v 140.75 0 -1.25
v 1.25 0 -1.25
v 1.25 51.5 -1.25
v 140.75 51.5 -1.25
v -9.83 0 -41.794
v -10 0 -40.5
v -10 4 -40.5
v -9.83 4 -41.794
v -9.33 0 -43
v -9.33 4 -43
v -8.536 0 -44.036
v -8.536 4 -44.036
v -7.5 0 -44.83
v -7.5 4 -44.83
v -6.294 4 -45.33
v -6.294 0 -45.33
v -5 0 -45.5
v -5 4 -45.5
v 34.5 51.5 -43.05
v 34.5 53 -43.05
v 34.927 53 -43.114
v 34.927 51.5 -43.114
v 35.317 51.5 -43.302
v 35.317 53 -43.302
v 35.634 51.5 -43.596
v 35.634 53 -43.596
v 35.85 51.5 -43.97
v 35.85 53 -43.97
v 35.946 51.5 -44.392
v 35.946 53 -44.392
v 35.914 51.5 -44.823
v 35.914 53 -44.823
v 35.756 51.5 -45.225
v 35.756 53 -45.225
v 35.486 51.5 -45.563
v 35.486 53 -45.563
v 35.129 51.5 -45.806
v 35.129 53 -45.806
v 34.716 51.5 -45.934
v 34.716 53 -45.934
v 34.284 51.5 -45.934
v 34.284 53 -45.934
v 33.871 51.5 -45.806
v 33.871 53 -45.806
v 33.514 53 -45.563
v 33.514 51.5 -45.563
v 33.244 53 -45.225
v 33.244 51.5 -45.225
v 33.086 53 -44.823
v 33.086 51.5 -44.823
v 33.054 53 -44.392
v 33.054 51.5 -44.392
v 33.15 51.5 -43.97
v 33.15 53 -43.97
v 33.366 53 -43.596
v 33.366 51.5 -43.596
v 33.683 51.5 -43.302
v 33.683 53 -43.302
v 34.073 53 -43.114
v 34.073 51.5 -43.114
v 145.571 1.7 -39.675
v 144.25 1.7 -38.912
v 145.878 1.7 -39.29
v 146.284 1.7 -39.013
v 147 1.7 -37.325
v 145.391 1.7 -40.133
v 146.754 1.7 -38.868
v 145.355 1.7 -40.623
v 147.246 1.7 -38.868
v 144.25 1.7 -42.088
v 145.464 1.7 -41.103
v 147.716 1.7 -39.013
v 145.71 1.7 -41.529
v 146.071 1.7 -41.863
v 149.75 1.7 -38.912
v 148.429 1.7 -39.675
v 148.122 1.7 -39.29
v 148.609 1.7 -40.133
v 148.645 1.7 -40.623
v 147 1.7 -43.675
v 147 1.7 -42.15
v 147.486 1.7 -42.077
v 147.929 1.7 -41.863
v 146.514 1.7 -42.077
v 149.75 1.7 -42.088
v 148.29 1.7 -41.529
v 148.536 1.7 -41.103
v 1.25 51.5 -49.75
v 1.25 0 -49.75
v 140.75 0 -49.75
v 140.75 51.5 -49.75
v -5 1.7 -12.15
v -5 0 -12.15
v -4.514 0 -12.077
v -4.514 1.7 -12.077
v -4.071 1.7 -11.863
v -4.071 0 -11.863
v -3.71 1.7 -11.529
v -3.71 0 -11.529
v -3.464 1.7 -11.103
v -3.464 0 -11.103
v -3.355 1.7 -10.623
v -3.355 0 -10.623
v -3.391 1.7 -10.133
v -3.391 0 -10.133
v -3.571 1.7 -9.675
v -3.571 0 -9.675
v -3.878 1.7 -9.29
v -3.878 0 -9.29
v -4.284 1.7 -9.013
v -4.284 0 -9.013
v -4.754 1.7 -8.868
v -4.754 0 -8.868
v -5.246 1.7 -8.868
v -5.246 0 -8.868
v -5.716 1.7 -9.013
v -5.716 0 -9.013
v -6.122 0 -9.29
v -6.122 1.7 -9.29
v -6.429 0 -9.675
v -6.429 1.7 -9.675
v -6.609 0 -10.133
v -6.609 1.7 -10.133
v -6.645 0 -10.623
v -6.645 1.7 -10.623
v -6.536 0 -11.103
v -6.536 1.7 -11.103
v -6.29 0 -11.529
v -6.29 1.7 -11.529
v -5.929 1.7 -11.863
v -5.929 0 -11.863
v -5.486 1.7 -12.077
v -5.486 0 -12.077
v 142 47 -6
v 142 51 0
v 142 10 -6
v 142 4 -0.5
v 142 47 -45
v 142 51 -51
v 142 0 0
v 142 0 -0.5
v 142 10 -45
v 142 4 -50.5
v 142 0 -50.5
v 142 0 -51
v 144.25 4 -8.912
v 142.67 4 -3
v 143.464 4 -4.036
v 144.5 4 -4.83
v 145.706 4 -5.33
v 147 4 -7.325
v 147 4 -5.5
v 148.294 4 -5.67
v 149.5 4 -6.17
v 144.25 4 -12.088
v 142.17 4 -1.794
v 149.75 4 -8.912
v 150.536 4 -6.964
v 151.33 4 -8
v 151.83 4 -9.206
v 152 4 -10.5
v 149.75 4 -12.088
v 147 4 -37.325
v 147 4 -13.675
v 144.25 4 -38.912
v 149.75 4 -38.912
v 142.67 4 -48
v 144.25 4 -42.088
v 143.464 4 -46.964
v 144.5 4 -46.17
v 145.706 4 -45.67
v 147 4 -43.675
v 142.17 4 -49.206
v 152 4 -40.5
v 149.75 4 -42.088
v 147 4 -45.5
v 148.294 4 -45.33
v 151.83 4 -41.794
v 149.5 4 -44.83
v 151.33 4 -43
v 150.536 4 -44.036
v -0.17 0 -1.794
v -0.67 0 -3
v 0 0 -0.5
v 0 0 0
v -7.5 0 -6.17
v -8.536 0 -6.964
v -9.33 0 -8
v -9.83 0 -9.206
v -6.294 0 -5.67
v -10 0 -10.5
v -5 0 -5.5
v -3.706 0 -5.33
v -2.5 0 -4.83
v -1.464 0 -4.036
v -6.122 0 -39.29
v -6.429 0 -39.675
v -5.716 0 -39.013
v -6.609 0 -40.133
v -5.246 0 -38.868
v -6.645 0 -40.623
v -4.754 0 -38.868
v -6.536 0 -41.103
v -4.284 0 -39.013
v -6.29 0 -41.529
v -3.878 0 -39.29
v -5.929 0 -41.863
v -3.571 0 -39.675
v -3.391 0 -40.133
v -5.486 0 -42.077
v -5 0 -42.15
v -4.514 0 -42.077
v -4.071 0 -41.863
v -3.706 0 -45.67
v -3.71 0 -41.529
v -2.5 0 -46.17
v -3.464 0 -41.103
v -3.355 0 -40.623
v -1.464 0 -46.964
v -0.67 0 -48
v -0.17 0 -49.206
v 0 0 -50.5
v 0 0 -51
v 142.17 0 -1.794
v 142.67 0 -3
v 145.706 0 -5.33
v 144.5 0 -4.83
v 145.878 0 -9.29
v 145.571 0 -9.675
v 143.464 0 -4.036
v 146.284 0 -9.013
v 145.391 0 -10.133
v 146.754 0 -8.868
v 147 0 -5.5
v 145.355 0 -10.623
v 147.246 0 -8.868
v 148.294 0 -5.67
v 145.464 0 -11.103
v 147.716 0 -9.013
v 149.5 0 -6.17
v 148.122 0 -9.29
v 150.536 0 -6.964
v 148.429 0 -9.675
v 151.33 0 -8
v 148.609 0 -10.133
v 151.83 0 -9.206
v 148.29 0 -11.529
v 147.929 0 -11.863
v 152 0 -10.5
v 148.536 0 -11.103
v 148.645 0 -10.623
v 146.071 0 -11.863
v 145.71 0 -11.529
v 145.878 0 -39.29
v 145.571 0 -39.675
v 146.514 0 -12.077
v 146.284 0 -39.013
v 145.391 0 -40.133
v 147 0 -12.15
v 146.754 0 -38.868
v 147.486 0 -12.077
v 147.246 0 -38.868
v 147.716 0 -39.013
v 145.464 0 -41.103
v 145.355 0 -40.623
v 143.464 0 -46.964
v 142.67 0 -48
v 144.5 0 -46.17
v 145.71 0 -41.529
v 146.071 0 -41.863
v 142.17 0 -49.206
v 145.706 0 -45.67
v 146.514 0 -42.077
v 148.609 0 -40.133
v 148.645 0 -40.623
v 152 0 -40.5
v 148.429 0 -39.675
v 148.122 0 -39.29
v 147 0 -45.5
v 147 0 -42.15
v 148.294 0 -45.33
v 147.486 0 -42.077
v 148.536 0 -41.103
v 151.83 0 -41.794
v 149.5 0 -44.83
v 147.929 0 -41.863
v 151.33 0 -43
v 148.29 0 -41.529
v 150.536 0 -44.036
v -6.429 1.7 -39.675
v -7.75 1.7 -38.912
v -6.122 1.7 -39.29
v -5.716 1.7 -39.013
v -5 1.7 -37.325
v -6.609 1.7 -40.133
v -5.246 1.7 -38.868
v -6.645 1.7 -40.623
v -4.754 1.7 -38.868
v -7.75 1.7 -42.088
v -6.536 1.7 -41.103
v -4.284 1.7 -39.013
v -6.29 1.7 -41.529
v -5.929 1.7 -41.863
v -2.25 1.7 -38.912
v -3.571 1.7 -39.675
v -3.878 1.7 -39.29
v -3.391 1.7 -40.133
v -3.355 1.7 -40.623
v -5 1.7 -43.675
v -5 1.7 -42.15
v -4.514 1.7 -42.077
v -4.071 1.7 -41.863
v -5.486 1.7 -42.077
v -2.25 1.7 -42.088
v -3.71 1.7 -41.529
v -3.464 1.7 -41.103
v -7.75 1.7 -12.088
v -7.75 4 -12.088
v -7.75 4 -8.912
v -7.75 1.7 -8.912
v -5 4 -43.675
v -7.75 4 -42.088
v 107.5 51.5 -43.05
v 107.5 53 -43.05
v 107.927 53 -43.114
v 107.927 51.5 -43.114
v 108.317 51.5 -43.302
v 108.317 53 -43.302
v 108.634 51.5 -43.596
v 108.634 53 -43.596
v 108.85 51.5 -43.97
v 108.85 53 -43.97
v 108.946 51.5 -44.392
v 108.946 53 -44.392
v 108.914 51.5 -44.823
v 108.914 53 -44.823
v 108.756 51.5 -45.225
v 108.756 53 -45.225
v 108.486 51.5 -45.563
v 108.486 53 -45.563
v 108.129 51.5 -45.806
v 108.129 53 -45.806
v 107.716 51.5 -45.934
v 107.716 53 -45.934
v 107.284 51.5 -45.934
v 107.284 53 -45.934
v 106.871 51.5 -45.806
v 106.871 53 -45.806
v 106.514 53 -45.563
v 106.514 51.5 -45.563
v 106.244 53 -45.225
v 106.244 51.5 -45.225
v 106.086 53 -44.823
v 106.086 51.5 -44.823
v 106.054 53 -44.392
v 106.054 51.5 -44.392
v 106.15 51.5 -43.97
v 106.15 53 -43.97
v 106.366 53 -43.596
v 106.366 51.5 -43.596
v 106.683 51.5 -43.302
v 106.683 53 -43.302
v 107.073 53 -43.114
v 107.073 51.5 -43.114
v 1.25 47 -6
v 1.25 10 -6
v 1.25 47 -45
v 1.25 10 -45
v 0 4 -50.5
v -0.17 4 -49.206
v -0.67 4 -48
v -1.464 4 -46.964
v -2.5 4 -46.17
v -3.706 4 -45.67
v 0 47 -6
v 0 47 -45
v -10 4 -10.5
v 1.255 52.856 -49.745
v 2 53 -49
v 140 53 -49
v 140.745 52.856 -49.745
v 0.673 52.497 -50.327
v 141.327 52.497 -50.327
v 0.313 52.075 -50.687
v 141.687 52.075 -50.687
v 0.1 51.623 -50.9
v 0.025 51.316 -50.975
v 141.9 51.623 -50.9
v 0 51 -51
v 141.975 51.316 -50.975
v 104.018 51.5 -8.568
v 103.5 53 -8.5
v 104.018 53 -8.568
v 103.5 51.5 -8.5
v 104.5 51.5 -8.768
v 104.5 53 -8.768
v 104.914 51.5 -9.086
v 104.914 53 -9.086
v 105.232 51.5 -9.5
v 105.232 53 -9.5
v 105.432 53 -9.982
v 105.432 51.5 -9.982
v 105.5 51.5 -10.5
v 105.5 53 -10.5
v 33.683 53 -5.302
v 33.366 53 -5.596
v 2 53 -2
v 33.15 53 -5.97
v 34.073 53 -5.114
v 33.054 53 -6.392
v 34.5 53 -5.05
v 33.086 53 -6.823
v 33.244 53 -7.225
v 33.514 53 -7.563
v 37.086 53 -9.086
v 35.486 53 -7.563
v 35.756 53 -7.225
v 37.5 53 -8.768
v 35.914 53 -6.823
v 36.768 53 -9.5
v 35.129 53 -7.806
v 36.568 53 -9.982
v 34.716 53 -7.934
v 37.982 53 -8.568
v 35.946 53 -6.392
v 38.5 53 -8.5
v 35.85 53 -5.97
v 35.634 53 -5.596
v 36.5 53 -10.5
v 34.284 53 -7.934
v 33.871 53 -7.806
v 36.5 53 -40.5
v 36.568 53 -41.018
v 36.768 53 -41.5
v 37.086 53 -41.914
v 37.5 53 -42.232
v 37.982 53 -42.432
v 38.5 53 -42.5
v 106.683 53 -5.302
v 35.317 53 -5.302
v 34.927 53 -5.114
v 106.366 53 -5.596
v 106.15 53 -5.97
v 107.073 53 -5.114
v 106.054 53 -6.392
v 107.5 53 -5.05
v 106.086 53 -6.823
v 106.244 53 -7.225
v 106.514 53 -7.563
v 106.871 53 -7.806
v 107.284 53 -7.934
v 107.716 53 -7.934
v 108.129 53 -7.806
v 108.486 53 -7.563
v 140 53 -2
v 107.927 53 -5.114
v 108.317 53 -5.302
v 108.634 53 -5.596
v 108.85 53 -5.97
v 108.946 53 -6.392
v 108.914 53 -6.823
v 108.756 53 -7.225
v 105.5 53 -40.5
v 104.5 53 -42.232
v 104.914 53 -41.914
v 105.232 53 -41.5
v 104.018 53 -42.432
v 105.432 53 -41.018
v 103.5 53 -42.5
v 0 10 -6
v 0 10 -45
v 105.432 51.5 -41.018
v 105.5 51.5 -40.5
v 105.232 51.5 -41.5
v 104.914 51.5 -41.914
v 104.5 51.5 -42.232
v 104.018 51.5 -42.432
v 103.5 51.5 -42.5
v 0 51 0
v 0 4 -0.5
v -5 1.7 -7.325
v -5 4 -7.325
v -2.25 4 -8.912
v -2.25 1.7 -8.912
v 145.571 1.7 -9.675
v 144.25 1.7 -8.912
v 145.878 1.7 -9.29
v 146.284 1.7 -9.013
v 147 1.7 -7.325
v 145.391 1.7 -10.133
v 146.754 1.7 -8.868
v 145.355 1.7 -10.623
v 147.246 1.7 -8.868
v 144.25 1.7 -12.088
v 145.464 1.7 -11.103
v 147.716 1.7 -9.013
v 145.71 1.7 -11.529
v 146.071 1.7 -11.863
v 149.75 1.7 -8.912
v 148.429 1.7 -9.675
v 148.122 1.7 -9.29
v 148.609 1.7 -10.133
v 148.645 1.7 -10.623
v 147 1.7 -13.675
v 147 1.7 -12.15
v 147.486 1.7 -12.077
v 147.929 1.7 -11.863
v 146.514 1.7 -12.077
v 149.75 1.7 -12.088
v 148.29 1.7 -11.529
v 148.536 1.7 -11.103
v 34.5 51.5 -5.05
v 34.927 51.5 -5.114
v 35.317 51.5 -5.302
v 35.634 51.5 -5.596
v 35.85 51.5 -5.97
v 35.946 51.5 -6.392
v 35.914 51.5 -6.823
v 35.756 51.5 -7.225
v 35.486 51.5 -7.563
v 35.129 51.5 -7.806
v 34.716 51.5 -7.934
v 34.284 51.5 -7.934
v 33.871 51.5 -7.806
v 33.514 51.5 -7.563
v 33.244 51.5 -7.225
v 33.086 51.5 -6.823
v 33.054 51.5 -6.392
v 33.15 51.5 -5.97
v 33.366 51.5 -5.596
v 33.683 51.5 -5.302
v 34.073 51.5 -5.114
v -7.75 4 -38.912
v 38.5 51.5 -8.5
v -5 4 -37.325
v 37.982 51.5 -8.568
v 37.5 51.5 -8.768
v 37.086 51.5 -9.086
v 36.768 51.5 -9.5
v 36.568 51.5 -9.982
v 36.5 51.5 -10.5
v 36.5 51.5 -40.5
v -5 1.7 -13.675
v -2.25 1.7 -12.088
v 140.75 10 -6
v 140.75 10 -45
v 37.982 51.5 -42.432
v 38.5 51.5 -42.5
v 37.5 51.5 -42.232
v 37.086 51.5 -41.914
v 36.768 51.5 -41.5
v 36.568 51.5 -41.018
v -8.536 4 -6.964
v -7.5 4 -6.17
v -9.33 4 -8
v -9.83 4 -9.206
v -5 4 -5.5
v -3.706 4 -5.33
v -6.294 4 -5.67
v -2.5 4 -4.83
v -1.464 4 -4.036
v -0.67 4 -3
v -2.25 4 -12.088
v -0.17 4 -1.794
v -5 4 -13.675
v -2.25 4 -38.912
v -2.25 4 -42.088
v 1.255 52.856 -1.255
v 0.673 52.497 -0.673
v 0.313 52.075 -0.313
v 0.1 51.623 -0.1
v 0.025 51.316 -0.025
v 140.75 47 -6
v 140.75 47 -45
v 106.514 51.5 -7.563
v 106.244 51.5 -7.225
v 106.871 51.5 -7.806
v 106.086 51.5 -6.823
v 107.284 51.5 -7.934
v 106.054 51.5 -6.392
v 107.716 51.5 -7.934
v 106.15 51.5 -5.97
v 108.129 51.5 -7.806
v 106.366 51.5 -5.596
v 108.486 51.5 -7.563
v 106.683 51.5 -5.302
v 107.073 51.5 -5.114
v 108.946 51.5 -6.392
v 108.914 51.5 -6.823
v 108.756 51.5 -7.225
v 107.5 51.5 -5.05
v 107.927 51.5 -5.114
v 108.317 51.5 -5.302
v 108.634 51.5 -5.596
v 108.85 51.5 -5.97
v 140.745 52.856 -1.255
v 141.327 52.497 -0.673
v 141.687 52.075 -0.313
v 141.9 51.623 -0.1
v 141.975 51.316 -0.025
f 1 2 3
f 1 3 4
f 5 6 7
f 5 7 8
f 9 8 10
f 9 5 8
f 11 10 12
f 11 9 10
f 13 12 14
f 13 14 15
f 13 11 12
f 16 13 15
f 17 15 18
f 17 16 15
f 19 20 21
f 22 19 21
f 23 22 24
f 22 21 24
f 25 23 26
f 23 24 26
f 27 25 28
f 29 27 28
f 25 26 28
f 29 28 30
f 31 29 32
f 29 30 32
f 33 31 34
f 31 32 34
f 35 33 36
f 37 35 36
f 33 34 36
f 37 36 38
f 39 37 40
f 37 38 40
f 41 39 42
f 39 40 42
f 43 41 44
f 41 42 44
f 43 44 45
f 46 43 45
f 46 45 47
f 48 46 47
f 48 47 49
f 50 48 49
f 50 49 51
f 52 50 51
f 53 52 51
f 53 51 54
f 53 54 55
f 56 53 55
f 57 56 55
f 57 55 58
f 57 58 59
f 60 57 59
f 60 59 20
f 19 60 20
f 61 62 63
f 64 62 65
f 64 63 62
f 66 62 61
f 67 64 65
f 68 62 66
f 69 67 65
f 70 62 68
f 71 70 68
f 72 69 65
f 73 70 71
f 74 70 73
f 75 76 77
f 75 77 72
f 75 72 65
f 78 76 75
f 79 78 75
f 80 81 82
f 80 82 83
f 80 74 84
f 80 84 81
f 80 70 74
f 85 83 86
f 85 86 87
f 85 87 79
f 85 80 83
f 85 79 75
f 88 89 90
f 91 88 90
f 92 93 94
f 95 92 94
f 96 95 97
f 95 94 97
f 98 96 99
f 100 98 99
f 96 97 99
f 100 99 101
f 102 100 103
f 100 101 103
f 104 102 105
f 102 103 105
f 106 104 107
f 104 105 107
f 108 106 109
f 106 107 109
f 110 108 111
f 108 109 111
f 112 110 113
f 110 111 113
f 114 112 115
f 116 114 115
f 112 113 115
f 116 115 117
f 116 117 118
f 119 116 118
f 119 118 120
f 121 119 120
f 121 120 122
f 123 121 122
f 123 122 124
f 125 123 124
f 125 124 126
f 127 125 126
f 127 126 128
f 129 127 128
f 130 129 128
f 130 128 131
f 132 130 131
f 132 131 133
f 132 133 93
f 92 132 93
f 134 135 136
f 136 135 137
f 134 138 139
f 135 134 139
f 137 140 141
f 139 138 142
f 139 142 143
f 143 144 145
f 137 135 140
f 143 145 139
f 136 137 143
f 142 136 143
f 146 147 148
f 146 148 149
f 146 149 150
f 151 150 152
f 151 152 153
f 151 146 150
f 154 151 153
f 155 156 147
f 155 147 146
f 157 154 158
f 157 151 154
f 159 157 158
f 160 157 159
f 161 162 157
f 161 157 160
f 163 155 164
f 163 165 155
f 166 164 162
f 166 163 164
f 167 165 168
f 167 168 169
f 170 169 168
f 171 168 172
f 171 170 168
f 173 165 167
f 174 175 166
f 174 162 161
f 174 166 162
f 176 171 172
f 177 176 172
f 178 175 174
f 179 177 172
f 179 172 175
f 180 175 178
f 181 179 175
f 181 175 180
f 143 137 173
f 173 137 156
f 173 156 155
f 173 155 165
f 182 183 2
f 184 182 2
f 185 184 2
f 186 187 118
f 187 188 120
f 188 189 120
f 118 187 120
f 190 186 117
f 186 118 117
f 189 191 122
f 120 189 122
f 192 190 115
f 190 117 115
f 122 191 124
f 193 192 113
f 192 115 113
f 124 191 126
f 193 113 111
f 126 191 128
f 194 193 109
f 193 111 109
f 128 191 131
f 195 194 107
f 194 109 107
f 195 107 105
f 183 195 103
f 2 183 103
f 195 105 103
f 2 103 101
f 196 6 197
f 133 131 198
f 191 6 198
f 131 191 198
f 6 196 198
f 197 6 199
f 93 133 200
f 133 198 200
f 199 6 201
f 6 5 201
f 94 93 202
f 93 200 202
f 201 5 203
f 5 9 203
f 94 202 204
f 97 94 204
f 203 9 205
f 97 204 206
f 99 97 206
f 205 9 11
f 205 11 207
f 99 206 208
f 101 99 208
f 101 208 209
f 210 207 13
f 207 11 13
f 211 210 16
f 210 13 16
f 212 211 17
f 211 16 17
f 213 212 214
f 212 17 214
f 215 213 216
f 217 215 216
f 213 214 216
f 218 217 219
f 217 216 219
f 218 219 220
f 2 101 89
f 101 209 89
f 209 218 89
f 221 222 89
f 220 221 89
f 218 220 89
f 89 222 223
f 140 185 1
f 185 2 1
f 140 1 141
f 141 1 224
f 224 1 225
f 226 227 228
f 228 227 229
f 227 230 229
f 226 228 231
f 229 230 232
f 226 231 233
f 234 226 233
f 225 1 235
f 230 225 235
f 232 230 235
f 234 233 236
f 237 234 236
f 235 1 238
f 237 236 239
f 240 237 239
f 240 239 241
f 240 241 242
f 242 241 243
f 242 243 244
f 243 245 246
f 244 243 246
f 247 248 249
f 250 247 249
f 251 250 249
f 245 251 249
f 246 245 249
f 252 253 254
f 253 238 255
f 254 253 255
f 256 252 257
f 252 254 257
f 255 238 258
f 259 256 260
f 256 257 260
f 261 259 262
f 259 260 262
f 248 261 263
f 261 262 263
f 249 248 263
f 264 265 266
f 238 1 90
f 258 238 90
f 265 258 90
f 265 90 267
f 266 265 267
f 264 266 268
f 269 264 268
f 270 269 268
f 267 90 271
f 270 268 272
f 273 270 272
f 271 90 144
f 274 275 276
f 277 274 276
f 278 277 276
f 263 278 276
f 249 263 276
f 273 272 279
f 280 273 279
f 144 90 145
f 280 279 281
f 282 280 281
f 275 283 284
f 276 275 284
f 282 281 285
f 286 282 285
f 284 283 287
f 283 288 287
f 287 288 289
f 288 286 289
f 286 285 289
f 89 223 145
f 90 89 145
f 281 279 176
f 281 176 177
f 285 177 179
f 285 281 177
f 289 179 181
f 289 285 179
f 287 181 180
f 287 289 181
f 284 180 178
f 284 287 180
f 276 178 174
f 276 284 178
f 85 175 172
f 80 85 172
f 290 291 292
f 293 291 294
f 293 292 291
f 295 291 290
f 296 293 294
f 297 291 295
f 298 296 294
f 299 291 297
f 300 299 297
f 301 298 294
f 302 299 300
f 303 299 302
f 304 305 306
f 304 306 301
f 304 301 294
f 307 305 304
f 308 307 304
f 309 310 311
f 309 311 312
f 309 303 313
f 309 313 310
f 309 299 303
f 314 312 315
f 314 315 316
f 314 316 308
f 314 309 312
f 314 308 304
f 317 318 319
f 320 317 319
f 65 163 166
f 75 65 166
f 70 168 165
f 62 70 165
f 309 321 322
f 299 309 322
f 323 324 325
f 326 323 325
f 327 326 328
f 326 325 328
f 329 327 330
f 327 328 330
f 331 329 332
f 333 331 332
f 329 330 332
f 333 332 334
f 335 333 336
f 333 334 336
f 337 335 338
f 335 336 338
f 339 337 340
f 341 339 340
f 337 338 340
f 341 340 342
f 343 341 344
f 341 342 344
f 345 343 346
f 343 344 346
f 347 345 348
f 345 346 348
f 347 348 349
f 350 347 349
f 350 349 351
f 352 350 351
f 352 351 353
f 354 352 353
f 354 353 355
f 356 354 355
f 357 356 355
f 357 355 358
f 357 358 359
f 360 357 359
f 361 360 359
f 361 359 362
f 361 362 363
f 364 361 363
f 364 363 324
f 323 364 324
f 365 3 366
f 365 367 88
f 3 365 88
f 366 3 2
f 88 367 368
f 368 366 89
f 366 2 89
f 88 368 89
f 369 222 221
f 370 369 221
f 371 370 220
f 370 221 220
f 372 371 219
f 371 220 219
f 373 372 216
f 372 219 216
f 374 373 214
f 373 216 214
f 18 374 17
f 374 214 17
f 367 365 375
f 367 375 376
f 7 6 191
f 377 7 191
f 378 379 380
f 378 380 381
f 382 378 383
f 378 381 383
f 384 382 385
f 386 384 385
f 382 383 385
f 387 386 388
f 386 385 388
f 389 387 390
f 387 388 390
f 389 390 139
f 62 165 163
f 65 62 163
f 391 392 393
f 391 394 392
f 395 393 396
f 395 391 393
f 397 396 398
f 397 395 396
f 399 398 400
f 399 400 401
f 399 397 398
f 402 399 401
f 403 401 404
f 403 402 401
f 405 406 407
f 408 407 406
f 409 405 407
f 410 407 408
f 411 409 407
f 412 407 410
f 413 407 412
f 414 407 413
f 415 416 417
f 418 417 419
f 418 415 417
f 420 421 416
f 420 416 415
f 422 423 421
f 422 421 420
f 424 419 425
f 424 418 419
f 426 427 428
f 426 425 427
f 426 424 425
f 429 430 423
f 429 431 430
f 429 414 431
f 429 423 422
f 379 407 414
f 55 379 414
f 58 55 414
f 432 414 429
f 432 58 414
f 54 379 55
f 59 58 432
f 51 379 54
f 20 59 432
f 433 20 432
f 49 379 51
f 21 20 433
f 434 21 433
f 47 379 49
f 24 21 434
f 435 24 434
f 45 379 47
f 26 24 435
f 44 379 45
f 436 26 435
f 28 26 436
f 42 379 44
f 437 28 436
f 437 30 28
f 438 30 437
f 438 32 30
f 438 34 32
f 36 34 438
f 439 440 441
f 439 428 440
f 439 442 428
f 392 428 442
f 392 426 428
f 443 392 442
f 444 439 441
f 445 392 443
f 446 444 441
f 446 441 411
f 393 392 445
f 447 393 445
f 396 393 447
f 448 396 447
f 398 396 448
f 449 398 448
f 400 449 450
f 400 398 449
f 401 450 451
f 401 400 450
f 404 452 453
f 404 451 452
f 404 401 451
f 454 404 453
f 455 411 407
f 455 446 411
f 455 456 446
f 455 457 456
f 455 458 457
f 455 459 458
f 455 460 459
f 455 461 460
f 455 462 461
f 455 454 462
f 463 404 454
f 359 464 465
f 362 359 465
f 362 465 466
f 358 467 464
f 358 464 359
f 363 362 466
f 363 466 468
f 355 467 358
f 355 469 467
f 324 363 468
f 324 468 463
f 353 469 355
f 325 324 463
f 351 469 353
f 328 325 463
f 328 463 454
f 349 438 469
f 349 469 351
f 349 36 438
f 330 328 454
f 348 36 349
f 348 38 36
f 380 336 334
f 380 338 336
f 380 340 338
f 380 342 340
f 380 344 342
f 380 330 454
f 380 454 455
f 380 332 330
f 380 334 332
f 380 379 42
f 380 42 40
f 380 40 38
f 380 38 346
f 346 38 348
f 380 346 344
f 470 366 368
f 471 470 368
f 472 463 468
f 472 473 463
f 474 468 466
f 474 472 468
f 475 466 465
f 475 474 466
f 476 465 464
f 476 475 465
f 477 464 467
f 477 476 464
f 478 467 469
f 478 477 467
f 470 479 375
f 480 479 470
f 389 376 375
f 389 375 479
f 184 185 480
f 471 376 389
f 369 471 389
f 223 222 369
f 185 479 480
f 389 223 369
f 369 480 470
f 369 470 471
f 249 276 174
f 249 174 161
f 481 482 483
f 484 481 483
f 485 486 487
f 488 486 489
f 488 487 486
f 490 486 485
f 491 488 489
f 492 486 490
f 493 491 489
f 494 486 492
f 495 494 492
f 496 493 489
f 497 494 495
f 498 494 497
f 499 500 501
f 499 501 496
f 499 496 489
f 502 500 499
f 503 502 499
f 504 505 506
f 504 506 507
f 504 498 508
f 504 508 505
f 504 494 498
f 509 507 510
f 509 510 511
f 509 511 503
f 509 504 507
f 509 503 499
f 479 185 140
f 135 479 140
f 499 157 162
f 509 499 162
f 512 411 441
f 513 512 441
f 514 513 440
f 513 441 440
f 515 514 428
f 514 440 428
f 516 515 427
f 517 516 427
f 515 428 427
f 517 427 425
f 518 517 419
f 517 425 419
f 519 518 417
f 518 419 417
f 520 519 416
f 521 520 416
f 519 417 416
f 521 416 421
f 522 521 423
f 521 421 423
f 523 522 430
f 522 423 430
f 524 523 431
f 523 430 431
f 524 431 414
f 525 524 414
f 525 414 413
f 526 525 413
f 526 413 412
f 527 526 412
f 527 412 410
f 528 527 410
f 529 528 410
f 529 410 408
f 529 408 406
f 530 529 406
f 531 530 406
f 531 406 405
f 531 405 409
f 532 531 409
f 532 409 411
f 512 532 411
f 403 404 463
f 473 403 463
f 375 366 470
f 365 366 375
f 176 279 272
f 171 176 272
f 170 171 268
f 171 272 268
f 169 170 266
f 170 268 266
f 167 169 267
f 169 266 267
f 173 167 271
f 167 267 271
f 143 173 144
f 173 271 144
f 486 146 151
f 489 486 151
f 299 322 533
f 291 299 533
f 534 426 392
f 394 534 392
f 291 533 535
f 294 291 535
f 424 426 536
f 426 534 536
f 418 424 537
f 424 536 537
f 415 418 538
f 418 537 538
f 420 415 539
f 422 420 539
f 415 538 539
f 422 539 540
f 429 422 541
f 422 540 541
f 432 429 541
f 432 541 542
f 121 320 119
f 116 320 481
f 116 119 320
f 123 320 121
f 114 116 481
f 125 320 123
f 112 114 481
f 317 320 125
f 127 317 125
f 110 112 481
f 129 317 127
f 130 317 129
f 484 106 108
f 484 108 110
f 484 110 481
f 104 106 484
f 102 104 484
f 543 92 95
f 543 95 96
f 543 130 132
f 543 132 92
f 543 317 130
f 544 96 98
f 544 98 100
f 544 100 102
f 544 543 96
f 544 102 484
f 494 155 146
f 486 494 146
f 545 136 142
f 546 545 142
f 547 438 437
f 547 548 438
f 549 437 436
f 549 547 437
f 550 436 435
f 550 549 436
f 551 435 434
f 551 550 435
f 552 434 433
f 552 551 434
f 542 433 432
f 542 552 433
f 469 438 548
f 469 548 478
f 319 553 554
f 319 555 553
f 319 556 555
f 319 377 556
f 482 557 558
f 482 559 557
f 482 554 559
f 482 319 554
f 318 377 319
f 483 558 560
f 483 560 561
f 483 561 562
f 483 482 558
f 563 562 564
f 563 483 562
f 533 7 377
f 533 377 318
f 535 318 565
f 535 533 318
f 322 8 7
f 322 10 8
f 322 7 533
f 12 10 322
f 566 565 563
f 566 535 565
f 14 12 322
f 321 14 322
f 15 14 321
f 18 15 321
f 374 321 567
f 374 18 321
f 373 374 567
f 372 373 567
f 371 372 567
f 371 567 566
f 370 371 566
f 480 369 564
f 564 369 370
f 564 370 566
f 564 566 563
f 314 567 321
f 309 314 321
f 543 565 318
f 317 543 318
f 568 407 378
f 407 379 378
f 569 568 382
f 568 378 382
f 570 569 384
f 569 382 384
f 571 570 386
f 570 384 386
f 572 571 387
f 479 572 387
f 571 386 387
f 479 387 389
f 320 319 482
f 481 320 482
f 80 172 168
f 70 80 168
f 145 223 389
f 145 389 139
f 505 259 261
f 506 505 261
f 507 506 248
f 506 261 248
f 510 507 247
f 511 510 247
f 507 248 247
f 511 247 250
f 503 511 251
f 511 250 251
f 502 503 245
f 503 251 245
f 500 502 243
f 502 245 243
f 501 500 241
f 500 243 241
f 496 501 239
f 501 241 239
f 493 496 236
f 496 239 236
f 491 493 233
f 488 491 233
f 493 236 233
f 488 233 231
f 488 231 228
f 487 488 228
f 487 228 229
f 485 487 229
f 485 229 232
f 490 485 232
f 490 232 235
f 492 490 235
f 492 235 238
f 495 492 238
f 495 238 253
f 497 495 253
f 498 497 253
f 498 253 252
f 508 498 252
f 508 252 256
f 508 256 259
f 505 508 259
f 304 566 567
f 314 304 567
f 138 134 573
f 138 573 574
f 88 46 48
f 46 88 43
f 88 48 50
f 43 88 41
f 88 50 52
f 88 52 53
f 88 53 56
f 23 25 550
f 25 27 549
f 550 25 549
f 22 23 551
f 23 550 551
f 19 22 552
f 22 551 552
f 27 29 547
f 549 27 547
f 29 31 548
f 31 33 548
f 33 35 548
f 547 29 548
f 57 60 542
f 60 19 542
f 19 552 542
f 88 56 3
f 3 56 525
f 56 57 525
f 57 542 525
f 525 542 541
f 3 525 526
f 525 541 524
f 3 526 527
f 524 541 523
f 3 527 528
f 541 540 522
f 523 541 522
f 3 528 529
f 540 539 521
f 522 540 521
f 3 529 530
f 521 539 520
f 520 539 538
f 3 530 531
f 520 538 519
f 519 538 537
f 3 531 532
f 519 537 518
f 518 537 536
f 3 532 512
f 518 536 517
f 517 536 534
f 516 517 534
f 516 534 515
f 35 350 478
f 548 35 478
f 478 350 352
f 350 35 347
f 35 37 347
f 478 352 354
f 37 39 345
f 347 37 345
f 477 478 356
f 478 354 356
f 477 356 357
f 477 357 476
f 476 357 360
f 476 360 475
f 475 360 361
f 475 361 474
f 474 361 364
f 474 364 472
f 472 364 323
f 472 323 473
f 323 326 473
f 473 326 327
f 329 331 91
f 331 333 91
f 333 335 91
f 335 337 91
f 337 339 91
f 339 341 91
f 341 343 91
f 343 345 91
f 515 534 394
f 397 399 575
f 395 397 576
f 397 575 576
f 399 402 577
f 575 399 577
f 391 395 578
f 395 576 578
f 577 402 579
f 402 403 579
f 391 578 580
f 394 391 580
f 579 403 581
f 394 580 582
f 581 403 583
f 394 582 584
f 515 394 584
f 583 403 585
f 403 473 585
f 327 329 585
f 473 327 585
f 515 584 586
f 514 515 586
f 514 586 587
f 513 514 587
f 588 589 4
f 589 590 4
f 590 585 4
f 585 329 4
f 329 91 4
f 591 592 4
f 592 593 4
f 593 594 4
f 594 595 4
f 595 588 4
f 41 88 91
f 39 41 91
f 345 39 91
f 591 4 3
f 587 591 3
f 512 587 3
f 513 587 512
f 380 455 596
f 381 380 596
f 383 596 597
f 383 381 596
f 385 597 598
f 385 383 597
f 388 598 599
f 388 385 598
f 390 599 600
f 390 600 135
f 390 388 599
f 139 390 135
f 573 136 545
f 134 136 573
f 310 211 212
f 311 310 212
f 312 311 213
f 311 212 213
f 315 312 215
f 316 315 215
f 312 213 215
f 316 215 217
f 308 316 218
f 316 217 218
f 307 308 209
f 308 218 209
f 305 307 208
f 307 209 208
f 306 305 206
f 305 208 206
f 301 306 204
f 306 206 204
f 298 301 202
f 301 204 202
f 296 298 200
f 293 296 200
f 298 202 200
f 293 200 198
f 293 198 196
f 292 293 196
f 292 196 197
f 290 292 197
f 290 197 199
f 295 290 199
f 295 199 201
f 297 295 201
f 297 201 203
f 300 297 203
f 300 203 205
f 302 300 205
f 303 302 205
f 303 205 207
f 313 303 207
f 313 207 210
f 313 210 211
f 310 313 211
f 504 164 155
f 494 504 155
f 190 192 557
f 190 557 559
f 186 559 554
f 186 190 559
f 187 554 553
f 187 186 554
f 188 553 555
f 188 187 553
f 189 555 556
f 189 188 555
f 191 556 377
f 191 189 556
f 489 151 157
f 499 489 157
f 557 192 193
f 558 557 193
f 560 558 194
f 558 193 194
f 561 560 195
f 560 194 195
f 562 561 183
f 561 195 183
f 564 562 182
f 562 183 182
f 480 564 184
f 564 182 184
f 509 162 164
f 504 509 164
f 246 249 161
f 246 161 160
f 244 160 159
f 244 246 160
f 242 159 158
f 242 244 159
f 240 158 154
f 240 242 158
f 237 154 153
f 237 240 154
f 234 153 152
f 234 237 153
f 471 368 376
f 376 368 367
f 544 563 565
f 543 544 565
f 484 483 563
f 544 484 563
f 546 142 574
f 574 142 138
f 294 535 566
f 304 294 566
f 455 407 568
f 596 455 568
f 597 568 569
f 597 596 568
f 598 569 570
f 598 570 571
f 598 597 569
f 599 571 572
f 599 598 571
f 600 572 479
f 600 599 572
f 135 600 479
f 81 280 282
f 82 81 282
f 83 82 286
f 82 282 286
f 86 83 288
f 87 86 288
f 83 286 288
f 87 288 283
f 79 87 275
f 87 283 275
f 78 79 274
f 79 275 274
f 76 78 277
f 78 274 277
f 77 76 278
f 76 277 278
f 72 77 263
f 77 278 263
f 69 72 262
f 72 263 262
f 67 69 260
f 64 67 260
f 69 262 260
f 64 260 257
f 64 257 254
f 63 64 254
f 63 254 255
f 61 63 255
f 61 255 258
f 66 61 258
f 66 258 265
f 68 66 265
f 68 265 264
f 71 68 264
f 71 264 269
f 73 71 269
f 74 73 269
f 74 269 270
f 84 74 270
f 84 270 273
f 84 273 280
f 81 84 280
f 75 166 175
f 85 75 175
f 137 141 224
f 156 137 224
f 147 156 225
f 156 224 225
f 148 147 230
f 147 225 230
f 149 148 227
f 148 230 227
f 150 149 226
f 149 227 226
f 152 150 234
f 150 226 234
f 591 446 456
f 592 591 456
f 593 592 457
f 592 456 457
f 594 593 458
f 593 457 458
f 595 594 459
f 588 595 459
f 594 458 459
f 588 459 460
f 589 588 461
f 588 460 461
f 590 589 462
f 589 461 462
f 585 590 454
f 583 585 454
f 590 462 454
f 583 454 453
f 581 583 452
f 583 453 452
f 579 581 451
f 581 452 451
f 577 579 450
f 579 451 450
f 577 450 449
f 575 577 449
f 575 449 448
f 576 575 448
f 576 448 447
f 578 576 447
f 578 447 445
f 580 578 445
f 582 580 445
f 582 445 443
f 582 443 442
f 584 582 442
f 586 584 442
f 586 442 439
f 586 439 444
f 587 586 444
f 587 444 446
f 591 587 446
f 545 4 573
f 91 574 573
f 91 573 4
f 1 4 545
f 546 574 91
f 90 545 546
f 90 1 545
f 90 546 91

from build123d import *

# Parameters (mm, degrees)
SKETCH1_W                 = 142
SKETCH1_H                 = 51
BOSS_EXTRUDE1_DEPTH       = 53
SHELL1_T                  = -1.25
SHELL1_THICKNESS_2_FACE_W = 48.5
SHELL1_THICKNESS_2_FACE_H = 139.5
SHELL1_THICKNESS_2_DEPTH  = 0.25
SKETCH2_W                 = 10
SKETCH2_H                 = 40
SKETCH2_R                 = 1.65
BOSS_EXTRUDE2_DEPTH       = 4
SKETCH3_W                 = 39
SKETCH3_H                 = 37
CUT_EXTRUDE1_DEPTH        = 169.860889492
CUT_EXTRUDE2_DEPTH        = 2.3
FILLET2_START             = -1
FILLET2_DEPTH             = 5
FILLET2_2_DEPTH           = 4
SKETCH5_R                 = 1.45
CUT_EXTRUDE3_DEPTH        = 169.860889492
SKETCH7_W                 = 69
SKETCH7_H                 = 34
CUT_EXTRUDE4_DEPTH        = 169.860889492
FILLET6_R                 = 2
FILLET7_R                 = 2


with BuildPart() as part:
    # Sketch1 → Boss-Extrude1 (new body)
    with BuildSketch(Plane(origin=(0, 0, 0), x_dir=(1, 0, 0), z_dir=(0, 1, 0))):
        with Locations((71, 25.5)):
            Rectangle(SKETCH1_W, SKETCH1_H)
    extrude(amount=BOSS_EXTRUDE1_DEPTH)

    # Shell1
    shell1_openings = [part.faces().sort_by_distance(p)[0] for p in [
        (71, 0, -25.5),
    ]]
    offset(amount=SHELL1_T, openings=shell1_openings, kind=Kind.INTERSECTION)

    # Shell1 thickness 2 face (on inner face of the shell) → Shell1 thickness 2 (add)
    with BuildSketch(Plane(origin=(71, 51.75, -25.5), x_dir=(0, 0, 1), z_dir=(0, 1, 0))):
        Rectangle(SHELL1_THICKNESS_2_FACE_W, SHELL1_THICKNESS_2_FACE_H)
    extrude(amount=-SHELL1_THICKNESS_2_DEPTH)

    # Sketch2 → Boss-Extrude2 (add)
    # profile 1 of 2: a face of its own
    with BuildSketch(Plane.XZ):
        with Locations((147, -25.5)):
            Rectangle(SKETCH2_W, SKETCH2_H)
        with Locations(Location((147, -40.5, 0), (0, 0, 270))):
            Circle(SKETCH2_R, mode=Mode.SUBTRACT)
        with Locations(Location((147, -10.5, 0), (0, 0, 270))):
            Circle(SKETCH2_R, mode=Mode.SUBTRACT)
    # profile 2 of 2: a face of its own
    with BuildSketch(Plane.XZ):
        with Locations((-5, -25.5)):
            Rectangle(SKETCH2_W, SKETCH2_H)
        with Locations(Location((-5, -40.5, 0), (0, 0, 270))):
            Circle(SKETCH2_R, mode=Mode.SUBTRACT)
        with Locations(Location((-5, -10.5, 0), (0, 0, 270))):
            Circle(SKETCH2_R, mode=Mode.SUBTRACT)
    extrude(amount=-BOSS_EXTRUDE2_DEPTH)

    # Sketch3 → Cut-Extrude1 (cut, through all)
    with BuildSketch(Plane(origin=(142, 0, 0), x_dir=(0, 0, -1), z_dir=(1, 0, 0))):
        with Locations((25.5, 28.5)):
            Rectangle(SKETCH3_W, SKETCH3_H)
    extrude(amount=-CUT_EXTRUDE1_DEPTH, mode=Mode.SUBTRACT)

    # Sketch4 → Cut-Extrude2 (cut)
    with BuildSketch(Plane(origin=(0, 4, 0), x_dir=(1, 0, 0), z_dir=(0, 1, 0))):
        Polygon((-5, 43.675426481), (-7.75, 42.08771324), (-7.75, 38.91228676), (-5, 37.324573519), (-2.25, 38.91228676), (-2.25, 42.08771324), align=None)
        Polygon((-5, 13.675426481), (-7.75, 12.08771324), (-7.75, 8.91228676), (-5, 7.324573519), (-2.25, 8.91228676), (-2.25, 12.08771324), align=None)
        Polygon((147, 43.675426481), (144.25, 42.08771324), (144.25, 38.91228676), (147, 37.324573519), (149.75, 38.91228676), (149.75, 42.08771324), align=None)
        Polygon((147, 13.675426481), (144.25, 12.08771324), (144.25, 8.91228676), (147, 7.324573519), (149.75, 8.91228676), (149.75, 12.08771324), align=None)
    extrude(amount=-CUT_EXTRUDE2_DEPTH, mode=Mode.SUBTRACT)

    # Fillet2: read off the stored shape, not the designer's step
    # Fillet2 outline → Fillet2 (cut)
    with BuildSketch(Plane(origin=(0, 0, 0), x_dir=(1, 0, 0), z_dir=(0, 1, 0)).offset(FILLET2_START)):
        with BuildLine():
            Line((-10, 5.5), (-5, 5.5))
            ThreePointArc((-5, 5.5), (-8.535533906, 6.964466094), (-10, 10.5))
            Line((-10, 10.5), (-10, 5.5))
        make_face()
        with BuildLine():
            Line((-10, 45.5), (-10, 40.5))
            ThreePointArc((-10, 40.5), (-8.535533906, 44.035533906), (-5, 45.5))
            Line((-5, 45.5), (-10, 45.5))
        make_face()
        with BuildLine():
            ThreePointArc((152, 10.5), (150.535533906, 6.964466094), (147, 5.5))
            Line((147, 5.5), (152, 5.5))
            Line((152, 5.5), (152, 10.5))
        make_face()
        with BuildLine():
            ThreePointArc((147, 45.5), (150.535533906, 44.035533906), (152, 40.5))
            Line((152, 40.5), (152, 45.5))
            Line((152, 45.5), (147, 45.5))
        make_face()
    extrude(amount=FILLET2_DEPTH, mode=Mode.SUBTRACT)

    # Fillet2 2 outline → Fillet2 2 (add)
    with BuildSketch(Plane(origin=(0, 0, 0), x_dir=(1, 0, 0), z_dir=(0, 1, 0))):
        with BuildLine():
            Line((0, 5.5), (-5, 5.5))
            ThreePointArc((-5, 5.5), (-1.464466094, 4.035533906), (0, 0.5))
            Line((0, 0.5), (0, 5.5))
        make_face()
        with BuildLine():
            Line((-5, 45.5), (0, 45.5))
            Line((0, 45.5), (0, 50.5))
            ThreePointArc((0, 50.5), (-1.464466094, 46.964466094), (-5, 45.5))
        make_face()
        with BuildLine():
            ThreePointArc((142, 0.5), (143.464466094, 4.035533906), (147, 5.5))
            Line((147, 5.5), (142, 5.5))
            Line((142, 5.5), (142, 0.5))
        make_face()
        with BuildLine():
            Line((142, 50.5), (142, 45.5))
            Line((142, 45.5), (147, 45.5))
            ThreePointArc((147, 45.5), (143.464466094, 46.964466094), (142, 50.5))
        make_face()
    extrude(amount=FILLET2_2_DEPTH)

    # Sketch5 → Cut-Extrude3 (cut, through all)
    with BuildSketch(Plane(origin=(0, 53, 0), x_dir=(1, 0, 0), z_dir=(0, 1, 0))):
        with Locations(Location((34.5, 44.5, 0), (0, 0, 270))):
            Circle(SKETCH5_R)
        with Locations(Location((34.5, 6.5, 0), (0, 0, 270))):
            Circle(SKETCH5_R)
        with Locations(Location((107.5, 6.5, 0), (0, 0, 270))):
            Circle(SKETCH5_R)
        with Locations(Location((107.5, 44.5, 0), (0, 0, 270))):
            Circle(SKETCH5_R)
    extrude(amount=-CUT_EXTRUDE3_DEPTH, mode=Mode.SUBTRACT)

    # Sketch7 → Cut-Extrude4 (cut, through all)
    with BuildSketch(Plane(origin=(0, 53, 0), x_dir=(1, 0, 0), z_dir=(0, 1, 0))):
        with Locations((71, 25.5)):
            Rectangle(SKETCH7_W, SKETCH7_H)
    extrude(amount=-CUT_EXTRUDE4_DEPTH, mode=Mode.SUBTRACT)

    # Fillet6
    fillet6_edges = [part.edges().sort_by_distance(p)[0] for p in [
        (36.5, 52.25, -8.5),
        (36.5, 52.25, -42.5),
        (105.5, 52.25, -42.5),
        (105.5, 52.25, -8.5),
    ]]
    fillet(fillet6_edges, radius=FILLET6_R)

    # Fillet7
    fillet7_edges = [part.edges().sort_by_distance(p)[0] for p in [
        (142, 53, -25.5),
        (71, 53, -51),
        (0, 53, -25.5),
        (71, 53, 0),
    ]]
    fillet(fillet7_edges, radius=FILLET7_R)


solid = part.part
